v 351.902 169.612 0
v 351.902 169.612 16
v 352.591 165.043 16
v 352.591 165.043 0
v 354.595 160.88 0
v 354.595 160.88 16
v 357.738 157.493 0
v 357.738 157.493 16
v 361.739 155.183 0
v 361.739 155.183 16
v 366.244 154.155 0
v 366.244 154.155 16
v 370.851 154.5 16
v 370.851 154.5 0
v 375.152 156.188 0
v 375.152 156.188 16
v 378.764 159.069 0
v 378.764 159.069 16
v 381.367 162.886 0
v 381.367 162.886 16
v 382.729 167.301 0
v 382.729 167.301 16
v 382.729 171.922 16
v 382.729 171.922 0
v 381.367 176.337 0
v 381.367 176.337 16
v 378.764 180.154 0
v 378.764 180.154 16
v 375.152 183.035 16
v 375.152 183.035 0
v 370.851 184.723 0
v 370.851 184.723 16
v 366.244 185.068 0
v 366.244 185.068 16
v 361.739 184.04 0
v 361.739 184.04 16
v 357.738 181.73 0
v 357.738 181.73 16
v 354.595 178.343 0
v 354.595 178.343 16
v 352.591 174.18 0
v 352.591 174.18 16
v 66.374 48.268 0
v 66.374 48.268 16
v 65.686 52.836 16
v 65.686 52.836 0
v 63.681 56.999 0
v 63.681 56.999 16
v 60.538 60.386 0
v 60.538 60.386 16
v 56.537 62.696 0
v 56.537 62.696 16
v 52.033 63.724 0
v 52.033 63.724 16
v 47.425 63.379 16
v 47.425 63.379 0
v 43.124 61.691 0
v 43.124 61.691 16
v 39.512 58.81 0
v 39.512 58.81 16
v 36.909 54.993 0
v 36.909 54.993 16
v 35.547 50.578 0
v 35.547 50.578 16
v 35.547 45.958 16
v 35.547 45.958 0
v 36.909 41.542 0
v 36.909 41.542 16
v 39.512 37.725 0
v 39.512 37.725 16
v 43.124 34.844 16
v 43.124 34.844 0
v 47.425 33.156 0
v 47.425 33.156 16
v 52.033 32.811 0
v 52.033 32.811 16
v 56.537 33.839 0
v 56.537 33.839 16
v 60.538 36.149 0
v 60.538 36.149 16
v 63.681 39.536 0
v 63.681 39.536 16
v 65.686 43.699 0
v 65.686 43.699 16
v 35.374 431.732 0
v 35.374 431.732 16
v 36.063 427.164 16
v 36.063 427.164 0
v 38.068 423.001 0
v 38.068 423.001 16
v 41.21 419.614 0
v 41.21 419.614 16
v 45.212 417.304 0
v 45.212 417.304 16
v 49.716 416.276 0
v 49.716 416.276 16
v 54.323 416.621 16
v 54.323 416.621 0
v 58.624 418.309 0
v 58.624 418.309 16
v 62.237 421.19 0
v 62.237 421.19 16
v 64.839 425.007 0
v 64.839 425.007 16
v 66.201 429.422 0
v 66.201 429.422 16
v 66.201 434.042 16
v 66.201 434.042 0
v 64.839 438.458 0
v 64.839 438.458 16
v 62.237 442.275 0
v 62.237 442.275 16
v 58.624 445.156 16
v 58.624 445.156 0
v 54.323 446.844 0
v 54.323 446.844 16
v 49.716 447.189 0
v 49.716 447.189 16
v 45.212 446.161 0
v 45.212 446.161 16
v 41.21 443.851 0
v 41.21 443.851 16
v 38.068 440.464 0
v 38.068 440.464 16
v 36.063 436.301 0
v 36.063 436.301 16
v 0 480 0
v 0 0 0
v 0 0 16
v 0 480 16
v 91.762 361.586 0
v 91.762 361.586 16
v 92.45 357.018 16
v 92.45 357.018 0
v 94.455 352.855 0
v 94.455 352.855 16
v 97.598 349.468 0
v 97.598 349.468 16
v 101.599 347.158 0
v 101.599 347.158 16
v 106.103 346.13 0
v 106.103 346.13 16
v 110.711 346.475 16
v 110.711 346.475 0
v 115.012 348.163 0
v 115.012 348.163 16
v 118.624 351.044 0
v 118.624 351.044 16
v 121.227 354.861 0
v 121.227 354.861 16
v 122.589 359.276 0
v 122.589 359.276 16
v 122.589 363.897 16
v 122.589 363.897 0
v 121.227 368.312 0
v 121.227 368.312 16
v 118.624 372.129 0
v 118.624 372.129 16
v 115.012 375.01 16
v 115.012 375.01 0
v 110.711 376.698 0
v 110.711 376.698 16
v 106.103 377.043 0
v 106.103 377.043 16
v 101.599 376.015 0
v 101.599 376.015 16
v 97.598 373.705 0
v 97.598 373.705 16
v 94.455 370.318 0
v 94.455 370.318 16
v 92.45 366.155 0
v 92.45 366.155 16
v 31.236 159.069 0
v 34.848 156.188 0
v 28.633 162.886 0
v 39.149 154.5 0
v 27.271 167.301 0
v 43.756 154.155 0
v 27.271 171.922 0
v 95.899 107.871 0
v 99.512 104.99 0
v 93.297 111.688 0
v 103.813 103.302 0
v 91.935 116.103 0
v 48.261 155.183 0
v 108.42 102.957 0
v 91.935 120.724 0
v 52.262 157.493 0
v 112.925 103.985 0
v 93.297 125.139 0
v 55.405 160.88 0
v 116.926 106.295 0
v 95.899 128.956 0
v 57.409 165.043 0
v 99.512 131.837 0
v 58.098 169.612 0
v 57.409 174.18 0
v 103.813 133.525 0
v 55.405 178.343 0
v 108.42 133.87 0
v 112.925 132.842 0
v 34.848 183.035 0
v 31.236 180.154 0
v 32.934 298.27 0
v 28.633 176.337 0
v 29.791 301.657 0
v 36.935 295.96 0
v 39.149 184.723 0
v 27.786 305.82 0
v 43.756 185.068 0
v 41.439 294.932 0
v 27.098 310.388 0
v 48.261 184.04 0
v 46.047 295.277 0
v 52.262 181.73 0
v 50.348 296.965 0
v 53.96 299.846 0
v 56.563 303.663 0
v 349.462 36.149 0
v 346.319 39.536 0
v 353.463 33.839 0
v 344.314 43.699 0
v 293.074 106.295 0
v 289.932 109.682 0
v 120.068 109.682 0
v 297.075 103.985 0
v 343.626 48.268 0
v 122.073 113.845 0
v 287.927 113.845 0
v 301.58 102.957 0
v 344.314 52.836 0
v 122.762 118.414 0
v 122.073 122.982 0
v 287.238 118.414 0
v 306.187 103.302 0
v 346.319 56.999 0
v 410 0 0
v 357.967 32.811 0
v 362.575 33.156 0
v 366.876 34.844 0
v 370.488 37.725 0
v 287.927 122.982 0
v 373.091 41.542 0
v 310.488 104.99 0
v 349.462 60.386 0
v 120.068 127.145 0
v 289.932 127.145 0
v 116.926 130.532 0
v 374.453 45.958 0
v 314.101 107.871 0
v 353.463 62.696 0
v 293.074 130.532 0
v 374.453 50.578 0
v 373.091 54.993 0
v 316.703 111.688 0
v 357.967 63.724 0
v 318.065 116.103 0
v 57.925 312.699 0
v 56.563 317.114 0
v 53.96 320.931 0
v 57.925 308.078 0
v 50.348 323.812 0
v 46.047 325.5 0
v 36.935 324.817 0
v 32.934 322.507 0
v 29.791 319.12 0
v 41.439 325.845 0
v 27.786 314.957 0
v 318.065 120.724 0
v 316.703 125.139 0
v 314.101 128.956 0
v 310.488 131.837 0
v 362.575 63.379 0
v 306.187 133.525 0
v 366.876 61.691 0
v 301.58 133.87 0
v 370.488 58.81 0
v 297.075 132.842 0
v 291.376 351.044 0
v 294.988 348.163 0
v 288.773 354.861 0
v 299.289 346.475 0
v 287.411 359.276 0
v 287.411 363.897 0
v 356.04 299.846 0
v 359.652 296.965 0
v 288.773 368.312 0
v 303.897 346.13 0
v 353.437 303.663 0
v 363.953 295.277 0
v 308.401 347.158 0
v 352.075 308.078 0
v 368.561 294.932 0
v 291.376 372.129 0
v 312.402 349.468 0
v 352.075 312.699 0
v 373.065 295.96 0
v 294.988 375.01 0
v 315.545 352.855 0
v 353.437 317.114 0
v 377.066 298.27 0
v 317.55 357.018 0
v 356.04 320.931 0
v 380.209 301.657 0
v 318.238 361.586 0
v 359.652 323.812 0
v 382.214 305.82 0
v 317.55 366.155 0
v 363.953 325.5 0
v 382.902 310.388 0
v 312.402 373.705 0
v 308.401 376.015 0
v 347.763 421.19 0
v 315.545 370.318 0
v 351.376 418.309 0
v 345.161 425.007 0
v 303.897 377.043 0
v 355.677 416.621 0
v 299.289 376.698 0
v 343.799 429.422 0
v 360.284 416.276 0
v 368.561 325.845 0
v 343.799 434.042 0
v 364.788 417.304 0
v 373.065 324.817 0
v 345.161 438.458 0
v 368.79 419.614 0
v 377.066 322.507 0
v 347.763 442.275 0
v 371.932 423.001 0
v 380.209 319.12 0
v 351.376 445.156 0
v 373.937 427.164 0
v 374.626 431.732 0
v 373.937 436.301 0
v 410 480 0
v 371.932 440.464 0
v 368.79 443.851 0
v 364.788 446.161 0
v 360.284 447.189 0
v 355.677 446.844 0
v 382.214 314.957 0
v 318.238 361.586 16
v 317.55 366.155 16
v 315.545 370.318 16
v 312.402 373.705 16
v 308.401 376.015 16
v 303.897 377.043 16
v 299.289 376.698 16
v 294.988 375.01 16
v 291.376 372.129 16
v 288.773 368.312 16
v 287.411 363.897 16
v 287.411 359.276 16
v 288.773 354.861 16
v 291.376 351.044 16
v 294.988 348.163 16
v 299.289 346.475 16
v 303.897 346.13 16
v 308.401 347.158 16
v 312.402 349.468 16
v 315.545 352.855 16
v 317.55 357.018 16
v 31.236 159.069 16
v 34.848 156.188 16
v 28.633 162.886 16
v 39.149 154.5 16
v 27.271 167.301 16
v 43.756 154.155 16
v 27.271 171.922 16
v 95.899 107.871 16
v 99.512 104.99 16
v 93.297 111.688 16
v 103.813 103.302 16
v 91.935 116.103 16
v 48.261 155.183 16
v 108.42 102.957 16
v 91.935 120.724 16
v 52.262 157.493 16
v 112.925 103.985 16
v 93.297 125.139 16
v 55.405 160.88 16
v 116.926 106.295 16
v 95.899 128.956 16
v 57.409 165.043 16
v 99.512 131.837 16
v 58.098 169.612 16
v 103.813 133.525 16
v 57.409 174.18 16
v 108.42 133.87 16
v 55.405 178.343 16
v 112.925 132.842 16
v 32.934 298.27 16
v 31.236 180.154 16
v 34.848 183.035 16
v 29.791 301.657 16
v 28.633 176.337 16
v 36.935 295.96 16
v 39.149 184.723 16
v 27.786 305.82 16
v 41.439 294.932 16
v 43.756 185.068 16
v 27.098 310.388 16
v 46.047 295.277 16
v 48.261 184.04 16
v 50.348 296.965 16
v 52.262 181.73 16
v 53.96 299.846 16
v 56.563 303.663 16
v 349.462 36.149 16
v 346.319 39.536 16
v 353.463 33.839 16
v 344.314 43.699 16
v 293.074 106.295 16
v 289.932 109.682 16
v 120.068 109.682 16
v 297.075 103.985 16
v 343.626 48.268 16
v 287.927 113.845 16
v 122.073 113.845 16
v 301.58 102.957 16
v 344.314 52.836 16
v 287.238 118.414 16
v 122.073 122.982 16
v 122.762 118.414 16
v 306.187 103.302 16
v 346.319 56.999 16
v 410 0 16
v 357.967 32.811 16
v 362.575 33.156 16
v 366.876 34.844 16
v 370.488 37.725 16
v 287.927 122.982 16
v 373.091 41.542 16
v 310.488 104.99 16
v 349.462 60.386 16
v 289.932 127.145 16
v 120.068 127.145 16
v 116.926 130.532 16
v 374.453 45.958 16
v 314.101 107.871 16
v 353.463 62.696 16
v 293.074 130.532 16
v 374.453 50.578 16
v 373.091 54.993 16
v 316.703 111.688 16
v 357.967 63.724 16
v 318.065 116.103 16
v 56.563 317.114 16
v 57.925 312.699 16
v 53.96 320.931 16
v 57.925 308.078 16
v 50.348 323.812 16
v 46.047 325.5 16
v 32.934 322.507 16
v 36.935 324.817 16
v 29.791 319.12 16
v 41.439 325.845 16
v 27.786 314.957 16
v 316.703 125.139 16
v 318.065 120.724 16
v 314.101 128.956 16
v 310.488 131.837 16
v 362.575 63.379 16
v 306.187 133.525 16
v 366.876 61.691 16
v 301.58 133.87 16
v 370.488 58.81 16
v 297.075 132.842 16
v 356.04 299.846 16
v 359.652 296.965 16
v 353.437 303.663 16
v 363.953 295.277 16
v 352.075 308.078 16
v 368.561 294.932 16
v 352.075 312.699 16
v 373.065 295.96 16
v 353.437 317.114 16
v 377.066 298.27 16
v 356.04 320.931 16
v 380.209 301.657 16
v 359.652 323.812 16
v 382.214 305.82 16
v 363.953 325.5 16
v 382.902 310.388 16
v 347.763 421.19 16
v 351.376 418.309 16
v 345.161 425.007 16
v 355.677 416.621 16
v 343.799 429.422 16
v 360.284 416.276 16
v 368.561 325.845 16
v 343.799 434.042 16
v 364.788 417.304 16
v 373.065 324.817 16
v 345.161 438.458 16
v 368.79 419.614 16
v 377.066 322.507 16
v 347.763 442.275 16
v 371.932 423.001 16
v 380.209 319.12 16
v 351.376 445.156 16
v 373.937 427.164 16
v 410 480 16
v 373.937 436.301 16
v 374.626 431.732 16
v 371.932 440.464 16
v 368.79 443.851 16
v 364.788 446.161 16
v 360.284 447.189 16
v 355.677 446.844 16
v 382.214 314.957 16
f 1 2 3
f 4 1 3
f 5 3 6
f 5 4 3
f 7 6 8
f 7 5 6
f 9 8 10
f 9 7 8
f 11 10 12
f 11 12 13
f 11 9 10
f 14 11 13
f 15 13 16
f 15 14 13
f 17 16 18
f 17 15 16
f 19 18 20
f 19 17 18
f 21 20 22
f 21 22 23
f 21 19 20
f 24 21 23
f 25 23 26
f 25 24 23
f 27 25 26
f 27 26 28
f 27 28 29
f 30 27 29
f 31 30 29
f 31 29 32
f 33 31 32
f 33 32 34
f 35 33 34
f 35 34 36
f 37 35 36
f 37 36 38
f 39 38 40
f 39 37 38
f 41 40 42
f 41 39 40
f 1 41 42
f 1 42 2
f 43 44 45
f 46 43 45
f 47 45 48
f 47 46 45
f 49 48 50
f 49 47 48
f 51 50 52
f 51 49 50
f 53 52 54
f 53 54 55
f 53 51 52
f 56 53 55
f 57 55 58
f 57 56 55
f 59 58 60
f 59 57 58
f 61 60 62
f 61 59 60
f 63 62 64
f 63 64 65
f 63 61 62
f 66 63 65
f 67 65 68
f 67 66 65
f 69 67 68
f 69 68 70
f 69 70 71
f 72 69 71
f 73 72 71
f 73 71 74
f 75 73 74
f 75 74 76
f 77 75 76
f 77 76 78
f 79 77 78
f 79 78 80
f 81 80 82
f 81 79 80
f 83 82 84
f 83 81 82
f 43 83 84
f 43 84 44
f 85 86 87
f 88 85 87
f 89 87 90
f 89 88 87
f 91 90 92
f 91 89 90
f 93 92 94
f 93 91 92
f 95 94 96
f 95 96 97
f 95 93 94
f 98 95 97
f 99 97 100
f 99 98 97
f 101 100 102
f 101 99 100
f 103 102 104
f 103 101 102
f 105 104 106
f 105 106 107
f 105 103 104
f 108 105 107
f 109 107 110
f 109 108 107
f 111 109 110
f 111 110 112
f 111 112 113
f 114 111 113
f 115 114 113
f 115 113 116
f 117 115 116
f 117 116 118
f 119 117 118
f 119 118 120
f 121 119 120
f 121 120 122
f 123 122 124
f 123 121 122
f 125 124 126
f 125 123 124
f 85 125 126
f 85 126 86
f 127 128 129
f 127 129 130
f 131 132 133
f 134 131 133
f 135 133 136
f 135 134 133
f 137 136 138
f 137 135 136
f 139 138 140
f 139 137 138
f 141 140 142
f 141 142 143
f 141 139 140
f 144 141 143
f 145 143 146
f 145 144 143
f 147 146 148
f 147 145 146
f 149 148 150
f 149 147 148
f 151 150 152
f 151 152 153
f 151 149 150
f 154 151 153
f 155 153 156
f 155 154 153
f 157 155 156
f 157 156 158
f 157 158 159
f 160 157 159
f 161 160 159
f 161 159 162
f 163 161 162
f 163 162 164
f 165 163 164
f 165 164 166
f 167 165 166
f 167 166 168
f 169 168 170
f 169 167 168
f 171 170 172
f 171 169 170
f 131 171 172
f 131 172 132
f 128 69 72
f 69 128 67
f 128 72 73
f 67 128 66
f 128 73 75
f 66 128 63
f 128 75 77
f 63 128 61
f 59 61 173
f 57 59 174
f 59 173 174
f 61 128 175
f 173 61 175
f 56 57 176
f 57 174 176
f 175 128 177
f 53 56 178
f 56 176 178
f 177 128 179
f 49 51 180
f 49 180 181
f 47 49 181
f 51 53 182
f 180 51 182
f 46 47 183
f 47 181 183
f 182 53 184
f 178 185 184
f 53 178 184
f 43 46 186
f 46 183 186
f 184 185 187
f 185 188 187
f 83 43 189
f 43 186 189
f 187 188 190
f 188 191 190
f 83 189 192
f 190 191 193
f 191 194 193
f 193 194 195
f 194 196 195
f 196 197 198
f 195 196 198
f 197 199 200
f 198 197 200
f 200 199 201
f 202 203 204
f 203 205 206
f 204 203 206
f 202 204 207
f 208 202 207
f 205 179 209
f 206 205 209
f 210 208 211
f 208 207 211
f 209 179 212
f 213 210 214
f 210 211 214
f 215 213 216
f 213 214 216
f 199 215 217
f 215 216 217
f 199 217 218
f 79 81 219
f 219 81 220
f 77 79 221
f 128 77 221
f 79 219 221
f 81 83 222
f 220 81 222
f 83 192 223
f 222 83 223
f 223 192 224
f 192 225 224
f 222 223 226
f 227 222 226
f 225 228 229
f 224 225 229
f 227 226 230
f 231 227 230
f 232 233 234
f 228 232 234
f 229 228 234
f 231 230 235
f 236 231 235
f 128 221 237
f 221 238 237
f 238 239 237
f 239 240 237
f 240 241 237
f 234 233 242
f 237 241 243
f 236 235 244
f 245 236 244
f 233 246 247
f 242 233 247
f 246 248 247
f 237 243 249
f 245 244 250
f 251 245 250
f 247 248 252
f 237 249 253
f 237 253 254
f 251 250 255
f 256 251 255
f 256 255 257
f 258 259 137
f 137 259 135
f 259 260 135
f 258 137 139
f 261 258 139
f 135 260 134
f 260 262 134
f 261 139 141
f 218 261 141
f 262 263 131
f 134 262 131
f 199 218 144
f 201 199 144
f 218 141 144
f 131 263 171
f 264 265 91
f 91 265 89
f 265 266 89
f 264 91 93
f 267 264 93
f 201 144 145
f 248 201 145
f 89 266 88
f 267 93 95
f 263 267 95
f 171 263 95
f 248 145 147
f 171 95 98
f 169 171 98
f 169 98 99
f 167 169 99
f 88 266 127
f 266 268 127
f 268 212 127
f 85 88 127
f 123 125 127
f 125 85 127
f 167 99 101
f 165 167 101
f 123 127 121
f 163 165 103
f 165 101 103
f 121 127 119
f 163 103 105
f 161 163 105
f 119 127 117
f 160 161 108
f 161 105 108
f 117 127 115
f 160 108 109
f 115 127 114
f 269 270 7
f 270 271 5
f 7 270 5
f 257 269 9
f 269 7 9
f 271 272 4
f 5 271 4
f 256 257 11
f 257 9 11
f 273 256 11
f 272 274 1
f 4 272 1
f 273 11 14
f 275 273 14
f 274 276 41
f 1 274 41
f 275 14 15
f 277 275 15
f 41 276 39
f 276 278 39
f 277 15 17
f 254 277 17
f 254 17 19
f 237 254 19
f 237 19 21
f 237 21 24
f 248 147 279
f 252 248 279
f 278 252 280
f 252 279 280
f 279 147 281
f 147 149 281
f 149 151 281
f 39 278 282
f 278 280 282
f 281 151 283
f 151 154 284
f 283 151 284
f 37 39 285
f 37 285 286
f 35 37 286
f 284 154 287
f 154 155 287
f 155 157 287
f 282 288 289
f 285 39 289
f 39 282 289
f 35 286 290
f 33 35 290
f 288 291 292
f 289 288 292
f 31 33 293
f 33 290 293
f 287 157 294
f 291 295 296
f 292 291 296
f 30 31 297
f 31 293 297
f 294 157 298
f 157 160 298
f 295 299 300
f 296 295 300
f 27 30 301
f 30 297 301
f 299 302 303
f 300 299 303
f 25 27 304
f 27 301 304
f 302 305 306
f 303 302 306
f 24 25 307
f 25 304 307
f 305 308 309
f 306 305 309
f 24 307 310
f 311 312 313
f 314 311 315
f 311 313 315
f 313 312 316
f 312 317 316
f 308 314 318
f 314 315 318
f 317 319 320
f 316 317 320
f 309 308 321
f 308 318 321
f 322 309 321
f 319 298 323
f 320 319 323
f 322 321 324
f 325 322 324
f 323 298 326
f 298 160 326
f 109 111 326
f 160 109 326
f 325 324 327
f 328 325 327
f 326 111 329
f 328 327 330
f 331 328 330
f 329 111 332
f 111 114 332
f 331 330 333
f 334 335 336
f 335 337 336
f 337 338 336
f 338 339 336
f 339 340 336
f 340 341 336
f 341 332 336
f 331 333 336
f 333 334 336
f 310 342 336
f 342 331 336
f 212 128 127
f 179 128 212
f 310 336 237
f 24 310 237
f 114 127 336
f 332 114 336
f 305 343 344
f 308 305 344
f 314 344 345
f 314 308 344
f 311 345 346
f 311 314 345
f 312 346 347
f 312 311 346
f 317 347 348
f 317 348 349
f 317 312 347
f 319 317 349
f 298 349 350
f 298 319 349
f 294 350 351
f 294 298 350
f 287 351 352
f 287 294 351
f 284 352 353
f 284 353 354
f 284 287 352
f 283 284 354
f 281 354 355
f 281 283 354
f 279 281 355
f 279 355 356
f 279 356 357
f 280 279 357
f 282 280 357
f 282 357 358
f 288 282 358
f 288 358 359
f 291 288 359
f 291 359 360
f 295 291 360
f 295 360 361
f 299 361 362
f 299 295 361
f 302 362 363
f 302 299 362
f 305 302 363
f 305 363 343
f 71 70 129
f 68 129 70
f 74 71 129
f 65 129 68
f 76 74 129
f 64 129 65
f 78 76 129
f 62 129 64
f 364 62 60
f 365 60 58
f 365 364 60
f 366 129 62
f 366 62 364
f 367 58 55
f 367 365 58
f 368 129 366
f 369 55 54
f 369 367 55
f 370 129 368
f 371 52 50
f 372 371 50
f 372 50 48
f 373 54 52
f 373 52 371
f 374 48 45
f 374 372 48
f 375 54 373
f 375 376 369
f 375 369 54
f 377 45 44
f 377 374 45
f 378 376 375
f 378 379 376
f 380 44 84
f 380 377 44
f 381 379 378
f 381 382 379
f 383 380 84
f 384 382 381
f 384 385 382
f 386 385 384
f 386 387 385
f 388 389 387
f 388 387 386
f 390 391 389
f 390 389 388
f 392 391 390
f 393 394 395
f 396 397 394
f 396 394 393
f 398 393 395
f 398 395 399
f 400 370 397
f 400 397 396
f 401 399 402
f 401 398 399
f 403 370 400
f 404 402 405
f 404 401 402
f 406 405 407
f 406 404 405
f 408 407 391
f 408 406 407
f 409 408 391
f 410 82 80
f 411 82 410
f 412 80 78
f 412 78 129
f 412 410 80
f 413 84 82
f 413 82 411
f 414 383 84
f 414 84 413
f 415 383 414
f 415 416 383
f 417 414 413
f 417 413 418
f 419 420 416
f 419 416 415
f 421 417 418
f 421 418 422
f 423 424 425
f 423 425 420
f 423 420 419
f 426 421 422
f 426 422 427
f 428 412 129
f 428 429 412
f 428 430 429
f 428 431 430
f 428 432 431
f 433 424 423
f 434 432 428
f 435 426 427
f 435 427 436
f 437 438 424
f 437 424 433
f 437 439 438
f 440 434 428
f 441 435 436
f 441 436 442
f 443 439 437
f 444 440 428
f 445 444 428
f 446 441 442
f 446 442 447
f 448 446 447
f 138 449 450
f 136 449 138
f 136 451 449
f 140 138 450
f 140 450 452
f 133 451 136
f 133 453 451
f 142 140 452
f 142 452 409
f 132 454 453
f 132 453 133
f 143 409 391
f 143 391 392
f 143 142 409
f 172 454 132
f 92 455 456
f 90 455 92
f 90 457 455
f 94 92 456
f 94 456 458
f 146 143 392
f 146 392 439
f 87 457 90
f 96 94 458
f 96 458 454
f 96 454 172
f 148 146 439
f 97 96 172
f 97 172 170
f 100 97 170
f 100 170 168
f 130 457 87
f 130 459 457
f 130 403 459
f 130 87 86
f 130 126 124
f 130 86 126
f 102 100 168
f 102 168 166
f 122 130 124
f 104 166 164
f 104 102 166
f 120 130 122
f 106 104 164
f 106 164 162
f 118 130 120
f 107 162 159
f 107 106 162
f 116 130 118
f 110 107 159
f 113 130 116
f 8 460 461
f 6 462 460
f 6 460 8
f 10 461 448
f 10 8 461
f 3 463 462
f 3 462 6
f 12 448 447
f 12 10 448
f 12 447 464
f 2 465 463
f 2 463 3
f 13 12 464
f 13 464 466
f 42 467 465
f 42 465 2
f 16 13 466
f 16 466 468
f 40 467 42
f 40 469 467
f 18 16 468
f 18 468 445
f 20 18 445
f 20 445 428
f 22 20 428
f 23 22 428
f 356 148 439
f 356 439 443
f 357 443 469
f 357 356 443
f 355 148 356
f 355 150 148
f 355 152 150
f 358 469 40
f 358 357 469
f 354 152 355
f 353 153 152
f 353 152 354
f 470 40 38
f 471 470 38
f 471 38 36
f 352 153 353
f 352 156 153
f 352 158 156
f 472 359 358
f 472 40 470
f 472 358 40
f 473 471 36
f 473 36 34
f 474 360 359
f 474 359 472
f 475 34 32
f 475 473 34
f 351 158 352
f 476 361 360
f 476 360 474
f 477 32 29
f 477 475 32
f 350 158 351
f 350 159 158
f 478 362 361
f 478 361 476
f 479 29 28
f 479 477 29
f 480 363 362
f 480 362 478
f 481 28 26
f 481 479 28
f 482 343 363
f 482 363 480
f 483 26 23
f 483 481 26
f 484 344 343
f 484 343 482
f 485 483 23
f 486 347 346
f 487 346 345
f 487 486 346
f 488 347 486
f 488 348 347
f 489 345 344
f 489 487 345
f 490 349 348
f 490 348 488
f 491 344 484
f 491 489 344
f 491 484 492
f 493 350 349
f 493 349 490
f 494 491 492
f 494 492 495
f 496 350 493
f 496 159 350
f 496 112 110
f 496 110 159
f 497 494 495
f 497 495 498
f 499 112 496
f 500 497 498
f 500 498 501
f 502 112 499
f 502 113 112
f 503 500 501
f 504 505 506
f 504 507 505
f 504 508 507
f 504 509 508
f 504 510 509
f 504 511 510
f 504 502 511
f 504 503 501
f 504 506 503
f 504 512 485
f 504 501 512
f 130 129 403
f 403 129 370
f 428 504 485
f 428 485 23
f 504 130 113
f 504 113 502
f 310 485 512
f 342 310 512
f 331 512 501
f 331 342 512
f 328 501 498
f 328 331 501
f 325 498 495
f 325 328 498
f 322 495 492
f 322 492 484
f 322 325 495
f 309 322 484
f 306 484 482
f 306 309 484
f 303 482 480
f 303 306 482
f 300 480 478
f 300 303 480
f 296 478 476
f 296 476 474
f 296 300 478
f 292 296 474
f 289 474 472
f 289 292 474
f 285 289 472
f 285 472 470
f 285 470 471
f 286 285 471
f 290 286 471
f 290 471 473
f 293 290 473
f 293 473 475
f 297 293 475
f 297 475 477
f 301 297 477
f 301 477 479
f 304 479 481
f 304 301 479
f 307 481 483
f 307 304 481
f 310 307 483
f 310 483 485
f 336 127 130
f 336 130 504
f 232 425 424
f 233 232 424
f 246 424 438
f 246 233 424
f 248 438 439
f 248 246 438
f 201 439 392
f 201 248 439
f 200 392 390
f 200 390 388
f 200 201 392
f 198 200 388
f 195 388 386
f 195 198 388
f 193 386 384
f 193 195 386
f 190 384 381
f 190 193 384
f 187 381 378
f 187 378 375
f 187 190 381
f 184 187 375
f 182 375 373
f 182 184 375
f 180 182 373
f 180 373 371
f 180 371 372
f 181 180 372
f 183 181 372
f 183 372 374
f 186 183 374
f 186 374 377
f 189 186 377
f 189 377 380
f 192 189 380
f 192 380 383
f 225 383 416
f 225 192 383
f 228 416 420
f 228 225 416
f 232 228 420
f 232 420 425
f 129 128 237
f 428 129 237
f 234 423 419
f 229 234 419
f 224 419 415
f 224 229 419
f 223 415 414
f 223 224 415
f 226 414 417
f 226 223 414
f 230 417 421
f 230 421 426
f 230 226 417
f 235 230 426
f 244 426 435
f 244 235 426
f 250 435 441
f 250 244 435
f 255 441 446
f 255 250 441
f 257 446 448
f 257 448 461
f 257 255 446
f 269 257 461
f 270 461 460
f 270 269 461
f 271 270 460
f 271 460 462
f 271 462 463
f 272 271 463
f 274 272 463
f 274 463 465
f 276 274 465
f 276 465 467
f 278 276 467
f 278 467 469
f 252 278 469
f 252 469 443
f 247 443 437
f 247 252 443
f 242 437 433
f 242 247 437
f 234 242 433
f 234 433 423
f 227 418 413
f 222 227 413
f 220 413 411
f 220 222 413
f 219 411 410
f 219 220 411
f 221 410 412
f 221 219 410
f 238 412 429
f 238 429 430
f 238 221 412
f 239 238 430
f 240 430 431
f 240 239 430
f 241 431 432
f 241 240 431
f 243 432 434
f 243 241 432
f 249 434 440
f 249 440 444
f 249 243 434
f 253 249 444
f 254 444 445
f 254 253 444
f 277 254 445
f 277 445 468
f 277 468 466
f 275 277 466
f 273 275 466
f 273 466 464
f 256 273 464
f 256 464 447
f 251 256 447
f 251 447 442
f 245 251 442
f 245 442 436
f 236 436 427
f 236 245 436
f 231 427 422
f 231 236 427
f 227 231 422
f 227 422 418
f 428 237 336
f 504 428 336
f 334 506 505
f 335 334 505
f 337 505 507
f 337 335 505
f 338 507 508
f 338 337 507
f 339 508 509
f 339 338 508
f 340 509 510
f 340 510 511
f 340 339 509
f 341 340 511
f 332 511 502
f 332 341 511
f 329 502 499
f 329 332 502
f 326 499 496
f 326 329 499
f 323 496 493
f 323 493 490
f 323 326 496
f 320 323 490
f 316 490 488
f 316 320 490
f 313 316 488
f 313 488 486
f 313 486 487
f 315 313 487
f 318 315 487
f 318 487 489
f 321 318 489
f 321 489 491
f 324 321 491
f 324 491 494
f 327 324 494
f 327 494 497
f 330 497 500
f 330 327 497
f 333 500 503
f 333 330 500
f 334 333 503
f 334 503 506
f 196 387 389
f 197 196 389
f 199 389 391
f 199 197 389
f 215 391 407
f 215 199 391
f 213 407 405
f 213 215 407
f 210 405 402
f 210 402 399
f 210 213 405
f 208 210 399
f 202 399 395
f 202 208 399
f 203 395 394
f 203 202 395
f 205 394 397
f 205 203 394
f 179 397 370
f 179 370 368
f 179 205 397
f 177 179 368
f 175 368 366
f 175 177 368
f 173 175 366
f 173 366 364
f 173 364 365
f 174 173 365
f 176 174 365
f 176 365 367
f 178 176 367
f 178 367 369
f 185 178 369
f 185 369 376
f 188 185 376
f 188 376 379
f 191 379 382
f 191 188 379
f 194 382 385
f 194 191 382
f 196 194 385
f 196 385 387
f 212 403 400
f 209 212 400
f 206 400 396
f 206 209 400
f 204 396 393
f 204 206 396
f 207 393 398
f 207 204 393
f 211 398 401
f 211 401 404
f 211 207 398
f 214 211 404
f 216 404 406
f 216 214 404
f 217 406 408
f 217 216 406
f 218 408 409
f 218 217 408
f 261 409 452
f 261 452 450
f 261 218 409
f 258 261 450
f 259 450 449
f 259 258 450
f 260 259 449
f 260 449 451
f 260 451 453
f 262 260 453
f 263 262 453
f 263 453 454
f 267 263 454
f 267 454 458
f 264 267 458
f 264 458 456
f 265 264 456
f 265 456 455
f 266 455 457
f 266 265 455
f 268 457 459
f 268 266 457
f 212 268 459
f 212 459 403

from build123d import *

# Parameters (mm, degrees)
SKETCH1_W      = 410
SKETCH1_H      = 480
SKETCH1_R      = 15.5
EXTRUDE1_DEPTH = 16


with BuildPart() as part:
    # Sketch1 → Extrude1 (new body)
    with BuildSketch(Plane.XY):
        with Locations((205, 240)):
            Rectangle(SKETCH1_W, SKETCH1_H)
        with Locations((367.4021887, 310.38841599)):
            Circle(SKETCH1_R, mode=Mode.SUBTRACT)
        with Locations((107.261778202, 118.413652083)):
            Circle(SKETCH1_R, mode=Mode.SUBTRACT)
        with Locations((50.874342549, 48.267682131)):
            Circle(SKETCH1_R, mode=Mode.SUBTRACT)
        with Locations(Location((42.5978113, 310.38841599, 0), (0, 0, 180))):
            Circle(SKETCH1_R, mode=Mode.SUBTRACT)
        with Locations(Location((359.125657451, 48.267682131, 0), (0, 0, 180))):
            Circle(SKETCH1_R, mode=Mode.SUBTRACT)
        with Locations(Location((302.738221798, 118.413652083, 0), (0, 0, 180))):
            Circle(SKETCH1_R, mode=Mode.SUBTRACT)
        with Locations(Location((367.4021887, 169.61158401, 0), (0, 0, 180))):
            Circle(SKETCH1_R, mode=Mode.SUBTRACT)
        with Locations(Location((50.874342549, 431.732317869, 0), (0, 0, 180))):
            Circle(SKETCH1_R, mode=Mode.SUBTRACT)
        with Locations(Location((107.261778202, 361.586347917, 0), (0, 0, 180))):
            Circle(SKETCH1_R, mode=Mode.SUBTRACT)
        with Locations((42.5978113, 169.61158401)):
            Circle(SKETCH1_R, mode=Mode.SUBTRACT)
        with Locations((302.738221798, 361.586347917)):
            Circle(SKETCH1_R, mode=Mode.SUBTRACT)
        with Locations((359.125657451, 431.732317869)):
            Circle(SKETCH1_R, mode=Mode.SUBTRACT)
    extrude(amount=EXTRUDE1_DEPTH)


solid = part.part
